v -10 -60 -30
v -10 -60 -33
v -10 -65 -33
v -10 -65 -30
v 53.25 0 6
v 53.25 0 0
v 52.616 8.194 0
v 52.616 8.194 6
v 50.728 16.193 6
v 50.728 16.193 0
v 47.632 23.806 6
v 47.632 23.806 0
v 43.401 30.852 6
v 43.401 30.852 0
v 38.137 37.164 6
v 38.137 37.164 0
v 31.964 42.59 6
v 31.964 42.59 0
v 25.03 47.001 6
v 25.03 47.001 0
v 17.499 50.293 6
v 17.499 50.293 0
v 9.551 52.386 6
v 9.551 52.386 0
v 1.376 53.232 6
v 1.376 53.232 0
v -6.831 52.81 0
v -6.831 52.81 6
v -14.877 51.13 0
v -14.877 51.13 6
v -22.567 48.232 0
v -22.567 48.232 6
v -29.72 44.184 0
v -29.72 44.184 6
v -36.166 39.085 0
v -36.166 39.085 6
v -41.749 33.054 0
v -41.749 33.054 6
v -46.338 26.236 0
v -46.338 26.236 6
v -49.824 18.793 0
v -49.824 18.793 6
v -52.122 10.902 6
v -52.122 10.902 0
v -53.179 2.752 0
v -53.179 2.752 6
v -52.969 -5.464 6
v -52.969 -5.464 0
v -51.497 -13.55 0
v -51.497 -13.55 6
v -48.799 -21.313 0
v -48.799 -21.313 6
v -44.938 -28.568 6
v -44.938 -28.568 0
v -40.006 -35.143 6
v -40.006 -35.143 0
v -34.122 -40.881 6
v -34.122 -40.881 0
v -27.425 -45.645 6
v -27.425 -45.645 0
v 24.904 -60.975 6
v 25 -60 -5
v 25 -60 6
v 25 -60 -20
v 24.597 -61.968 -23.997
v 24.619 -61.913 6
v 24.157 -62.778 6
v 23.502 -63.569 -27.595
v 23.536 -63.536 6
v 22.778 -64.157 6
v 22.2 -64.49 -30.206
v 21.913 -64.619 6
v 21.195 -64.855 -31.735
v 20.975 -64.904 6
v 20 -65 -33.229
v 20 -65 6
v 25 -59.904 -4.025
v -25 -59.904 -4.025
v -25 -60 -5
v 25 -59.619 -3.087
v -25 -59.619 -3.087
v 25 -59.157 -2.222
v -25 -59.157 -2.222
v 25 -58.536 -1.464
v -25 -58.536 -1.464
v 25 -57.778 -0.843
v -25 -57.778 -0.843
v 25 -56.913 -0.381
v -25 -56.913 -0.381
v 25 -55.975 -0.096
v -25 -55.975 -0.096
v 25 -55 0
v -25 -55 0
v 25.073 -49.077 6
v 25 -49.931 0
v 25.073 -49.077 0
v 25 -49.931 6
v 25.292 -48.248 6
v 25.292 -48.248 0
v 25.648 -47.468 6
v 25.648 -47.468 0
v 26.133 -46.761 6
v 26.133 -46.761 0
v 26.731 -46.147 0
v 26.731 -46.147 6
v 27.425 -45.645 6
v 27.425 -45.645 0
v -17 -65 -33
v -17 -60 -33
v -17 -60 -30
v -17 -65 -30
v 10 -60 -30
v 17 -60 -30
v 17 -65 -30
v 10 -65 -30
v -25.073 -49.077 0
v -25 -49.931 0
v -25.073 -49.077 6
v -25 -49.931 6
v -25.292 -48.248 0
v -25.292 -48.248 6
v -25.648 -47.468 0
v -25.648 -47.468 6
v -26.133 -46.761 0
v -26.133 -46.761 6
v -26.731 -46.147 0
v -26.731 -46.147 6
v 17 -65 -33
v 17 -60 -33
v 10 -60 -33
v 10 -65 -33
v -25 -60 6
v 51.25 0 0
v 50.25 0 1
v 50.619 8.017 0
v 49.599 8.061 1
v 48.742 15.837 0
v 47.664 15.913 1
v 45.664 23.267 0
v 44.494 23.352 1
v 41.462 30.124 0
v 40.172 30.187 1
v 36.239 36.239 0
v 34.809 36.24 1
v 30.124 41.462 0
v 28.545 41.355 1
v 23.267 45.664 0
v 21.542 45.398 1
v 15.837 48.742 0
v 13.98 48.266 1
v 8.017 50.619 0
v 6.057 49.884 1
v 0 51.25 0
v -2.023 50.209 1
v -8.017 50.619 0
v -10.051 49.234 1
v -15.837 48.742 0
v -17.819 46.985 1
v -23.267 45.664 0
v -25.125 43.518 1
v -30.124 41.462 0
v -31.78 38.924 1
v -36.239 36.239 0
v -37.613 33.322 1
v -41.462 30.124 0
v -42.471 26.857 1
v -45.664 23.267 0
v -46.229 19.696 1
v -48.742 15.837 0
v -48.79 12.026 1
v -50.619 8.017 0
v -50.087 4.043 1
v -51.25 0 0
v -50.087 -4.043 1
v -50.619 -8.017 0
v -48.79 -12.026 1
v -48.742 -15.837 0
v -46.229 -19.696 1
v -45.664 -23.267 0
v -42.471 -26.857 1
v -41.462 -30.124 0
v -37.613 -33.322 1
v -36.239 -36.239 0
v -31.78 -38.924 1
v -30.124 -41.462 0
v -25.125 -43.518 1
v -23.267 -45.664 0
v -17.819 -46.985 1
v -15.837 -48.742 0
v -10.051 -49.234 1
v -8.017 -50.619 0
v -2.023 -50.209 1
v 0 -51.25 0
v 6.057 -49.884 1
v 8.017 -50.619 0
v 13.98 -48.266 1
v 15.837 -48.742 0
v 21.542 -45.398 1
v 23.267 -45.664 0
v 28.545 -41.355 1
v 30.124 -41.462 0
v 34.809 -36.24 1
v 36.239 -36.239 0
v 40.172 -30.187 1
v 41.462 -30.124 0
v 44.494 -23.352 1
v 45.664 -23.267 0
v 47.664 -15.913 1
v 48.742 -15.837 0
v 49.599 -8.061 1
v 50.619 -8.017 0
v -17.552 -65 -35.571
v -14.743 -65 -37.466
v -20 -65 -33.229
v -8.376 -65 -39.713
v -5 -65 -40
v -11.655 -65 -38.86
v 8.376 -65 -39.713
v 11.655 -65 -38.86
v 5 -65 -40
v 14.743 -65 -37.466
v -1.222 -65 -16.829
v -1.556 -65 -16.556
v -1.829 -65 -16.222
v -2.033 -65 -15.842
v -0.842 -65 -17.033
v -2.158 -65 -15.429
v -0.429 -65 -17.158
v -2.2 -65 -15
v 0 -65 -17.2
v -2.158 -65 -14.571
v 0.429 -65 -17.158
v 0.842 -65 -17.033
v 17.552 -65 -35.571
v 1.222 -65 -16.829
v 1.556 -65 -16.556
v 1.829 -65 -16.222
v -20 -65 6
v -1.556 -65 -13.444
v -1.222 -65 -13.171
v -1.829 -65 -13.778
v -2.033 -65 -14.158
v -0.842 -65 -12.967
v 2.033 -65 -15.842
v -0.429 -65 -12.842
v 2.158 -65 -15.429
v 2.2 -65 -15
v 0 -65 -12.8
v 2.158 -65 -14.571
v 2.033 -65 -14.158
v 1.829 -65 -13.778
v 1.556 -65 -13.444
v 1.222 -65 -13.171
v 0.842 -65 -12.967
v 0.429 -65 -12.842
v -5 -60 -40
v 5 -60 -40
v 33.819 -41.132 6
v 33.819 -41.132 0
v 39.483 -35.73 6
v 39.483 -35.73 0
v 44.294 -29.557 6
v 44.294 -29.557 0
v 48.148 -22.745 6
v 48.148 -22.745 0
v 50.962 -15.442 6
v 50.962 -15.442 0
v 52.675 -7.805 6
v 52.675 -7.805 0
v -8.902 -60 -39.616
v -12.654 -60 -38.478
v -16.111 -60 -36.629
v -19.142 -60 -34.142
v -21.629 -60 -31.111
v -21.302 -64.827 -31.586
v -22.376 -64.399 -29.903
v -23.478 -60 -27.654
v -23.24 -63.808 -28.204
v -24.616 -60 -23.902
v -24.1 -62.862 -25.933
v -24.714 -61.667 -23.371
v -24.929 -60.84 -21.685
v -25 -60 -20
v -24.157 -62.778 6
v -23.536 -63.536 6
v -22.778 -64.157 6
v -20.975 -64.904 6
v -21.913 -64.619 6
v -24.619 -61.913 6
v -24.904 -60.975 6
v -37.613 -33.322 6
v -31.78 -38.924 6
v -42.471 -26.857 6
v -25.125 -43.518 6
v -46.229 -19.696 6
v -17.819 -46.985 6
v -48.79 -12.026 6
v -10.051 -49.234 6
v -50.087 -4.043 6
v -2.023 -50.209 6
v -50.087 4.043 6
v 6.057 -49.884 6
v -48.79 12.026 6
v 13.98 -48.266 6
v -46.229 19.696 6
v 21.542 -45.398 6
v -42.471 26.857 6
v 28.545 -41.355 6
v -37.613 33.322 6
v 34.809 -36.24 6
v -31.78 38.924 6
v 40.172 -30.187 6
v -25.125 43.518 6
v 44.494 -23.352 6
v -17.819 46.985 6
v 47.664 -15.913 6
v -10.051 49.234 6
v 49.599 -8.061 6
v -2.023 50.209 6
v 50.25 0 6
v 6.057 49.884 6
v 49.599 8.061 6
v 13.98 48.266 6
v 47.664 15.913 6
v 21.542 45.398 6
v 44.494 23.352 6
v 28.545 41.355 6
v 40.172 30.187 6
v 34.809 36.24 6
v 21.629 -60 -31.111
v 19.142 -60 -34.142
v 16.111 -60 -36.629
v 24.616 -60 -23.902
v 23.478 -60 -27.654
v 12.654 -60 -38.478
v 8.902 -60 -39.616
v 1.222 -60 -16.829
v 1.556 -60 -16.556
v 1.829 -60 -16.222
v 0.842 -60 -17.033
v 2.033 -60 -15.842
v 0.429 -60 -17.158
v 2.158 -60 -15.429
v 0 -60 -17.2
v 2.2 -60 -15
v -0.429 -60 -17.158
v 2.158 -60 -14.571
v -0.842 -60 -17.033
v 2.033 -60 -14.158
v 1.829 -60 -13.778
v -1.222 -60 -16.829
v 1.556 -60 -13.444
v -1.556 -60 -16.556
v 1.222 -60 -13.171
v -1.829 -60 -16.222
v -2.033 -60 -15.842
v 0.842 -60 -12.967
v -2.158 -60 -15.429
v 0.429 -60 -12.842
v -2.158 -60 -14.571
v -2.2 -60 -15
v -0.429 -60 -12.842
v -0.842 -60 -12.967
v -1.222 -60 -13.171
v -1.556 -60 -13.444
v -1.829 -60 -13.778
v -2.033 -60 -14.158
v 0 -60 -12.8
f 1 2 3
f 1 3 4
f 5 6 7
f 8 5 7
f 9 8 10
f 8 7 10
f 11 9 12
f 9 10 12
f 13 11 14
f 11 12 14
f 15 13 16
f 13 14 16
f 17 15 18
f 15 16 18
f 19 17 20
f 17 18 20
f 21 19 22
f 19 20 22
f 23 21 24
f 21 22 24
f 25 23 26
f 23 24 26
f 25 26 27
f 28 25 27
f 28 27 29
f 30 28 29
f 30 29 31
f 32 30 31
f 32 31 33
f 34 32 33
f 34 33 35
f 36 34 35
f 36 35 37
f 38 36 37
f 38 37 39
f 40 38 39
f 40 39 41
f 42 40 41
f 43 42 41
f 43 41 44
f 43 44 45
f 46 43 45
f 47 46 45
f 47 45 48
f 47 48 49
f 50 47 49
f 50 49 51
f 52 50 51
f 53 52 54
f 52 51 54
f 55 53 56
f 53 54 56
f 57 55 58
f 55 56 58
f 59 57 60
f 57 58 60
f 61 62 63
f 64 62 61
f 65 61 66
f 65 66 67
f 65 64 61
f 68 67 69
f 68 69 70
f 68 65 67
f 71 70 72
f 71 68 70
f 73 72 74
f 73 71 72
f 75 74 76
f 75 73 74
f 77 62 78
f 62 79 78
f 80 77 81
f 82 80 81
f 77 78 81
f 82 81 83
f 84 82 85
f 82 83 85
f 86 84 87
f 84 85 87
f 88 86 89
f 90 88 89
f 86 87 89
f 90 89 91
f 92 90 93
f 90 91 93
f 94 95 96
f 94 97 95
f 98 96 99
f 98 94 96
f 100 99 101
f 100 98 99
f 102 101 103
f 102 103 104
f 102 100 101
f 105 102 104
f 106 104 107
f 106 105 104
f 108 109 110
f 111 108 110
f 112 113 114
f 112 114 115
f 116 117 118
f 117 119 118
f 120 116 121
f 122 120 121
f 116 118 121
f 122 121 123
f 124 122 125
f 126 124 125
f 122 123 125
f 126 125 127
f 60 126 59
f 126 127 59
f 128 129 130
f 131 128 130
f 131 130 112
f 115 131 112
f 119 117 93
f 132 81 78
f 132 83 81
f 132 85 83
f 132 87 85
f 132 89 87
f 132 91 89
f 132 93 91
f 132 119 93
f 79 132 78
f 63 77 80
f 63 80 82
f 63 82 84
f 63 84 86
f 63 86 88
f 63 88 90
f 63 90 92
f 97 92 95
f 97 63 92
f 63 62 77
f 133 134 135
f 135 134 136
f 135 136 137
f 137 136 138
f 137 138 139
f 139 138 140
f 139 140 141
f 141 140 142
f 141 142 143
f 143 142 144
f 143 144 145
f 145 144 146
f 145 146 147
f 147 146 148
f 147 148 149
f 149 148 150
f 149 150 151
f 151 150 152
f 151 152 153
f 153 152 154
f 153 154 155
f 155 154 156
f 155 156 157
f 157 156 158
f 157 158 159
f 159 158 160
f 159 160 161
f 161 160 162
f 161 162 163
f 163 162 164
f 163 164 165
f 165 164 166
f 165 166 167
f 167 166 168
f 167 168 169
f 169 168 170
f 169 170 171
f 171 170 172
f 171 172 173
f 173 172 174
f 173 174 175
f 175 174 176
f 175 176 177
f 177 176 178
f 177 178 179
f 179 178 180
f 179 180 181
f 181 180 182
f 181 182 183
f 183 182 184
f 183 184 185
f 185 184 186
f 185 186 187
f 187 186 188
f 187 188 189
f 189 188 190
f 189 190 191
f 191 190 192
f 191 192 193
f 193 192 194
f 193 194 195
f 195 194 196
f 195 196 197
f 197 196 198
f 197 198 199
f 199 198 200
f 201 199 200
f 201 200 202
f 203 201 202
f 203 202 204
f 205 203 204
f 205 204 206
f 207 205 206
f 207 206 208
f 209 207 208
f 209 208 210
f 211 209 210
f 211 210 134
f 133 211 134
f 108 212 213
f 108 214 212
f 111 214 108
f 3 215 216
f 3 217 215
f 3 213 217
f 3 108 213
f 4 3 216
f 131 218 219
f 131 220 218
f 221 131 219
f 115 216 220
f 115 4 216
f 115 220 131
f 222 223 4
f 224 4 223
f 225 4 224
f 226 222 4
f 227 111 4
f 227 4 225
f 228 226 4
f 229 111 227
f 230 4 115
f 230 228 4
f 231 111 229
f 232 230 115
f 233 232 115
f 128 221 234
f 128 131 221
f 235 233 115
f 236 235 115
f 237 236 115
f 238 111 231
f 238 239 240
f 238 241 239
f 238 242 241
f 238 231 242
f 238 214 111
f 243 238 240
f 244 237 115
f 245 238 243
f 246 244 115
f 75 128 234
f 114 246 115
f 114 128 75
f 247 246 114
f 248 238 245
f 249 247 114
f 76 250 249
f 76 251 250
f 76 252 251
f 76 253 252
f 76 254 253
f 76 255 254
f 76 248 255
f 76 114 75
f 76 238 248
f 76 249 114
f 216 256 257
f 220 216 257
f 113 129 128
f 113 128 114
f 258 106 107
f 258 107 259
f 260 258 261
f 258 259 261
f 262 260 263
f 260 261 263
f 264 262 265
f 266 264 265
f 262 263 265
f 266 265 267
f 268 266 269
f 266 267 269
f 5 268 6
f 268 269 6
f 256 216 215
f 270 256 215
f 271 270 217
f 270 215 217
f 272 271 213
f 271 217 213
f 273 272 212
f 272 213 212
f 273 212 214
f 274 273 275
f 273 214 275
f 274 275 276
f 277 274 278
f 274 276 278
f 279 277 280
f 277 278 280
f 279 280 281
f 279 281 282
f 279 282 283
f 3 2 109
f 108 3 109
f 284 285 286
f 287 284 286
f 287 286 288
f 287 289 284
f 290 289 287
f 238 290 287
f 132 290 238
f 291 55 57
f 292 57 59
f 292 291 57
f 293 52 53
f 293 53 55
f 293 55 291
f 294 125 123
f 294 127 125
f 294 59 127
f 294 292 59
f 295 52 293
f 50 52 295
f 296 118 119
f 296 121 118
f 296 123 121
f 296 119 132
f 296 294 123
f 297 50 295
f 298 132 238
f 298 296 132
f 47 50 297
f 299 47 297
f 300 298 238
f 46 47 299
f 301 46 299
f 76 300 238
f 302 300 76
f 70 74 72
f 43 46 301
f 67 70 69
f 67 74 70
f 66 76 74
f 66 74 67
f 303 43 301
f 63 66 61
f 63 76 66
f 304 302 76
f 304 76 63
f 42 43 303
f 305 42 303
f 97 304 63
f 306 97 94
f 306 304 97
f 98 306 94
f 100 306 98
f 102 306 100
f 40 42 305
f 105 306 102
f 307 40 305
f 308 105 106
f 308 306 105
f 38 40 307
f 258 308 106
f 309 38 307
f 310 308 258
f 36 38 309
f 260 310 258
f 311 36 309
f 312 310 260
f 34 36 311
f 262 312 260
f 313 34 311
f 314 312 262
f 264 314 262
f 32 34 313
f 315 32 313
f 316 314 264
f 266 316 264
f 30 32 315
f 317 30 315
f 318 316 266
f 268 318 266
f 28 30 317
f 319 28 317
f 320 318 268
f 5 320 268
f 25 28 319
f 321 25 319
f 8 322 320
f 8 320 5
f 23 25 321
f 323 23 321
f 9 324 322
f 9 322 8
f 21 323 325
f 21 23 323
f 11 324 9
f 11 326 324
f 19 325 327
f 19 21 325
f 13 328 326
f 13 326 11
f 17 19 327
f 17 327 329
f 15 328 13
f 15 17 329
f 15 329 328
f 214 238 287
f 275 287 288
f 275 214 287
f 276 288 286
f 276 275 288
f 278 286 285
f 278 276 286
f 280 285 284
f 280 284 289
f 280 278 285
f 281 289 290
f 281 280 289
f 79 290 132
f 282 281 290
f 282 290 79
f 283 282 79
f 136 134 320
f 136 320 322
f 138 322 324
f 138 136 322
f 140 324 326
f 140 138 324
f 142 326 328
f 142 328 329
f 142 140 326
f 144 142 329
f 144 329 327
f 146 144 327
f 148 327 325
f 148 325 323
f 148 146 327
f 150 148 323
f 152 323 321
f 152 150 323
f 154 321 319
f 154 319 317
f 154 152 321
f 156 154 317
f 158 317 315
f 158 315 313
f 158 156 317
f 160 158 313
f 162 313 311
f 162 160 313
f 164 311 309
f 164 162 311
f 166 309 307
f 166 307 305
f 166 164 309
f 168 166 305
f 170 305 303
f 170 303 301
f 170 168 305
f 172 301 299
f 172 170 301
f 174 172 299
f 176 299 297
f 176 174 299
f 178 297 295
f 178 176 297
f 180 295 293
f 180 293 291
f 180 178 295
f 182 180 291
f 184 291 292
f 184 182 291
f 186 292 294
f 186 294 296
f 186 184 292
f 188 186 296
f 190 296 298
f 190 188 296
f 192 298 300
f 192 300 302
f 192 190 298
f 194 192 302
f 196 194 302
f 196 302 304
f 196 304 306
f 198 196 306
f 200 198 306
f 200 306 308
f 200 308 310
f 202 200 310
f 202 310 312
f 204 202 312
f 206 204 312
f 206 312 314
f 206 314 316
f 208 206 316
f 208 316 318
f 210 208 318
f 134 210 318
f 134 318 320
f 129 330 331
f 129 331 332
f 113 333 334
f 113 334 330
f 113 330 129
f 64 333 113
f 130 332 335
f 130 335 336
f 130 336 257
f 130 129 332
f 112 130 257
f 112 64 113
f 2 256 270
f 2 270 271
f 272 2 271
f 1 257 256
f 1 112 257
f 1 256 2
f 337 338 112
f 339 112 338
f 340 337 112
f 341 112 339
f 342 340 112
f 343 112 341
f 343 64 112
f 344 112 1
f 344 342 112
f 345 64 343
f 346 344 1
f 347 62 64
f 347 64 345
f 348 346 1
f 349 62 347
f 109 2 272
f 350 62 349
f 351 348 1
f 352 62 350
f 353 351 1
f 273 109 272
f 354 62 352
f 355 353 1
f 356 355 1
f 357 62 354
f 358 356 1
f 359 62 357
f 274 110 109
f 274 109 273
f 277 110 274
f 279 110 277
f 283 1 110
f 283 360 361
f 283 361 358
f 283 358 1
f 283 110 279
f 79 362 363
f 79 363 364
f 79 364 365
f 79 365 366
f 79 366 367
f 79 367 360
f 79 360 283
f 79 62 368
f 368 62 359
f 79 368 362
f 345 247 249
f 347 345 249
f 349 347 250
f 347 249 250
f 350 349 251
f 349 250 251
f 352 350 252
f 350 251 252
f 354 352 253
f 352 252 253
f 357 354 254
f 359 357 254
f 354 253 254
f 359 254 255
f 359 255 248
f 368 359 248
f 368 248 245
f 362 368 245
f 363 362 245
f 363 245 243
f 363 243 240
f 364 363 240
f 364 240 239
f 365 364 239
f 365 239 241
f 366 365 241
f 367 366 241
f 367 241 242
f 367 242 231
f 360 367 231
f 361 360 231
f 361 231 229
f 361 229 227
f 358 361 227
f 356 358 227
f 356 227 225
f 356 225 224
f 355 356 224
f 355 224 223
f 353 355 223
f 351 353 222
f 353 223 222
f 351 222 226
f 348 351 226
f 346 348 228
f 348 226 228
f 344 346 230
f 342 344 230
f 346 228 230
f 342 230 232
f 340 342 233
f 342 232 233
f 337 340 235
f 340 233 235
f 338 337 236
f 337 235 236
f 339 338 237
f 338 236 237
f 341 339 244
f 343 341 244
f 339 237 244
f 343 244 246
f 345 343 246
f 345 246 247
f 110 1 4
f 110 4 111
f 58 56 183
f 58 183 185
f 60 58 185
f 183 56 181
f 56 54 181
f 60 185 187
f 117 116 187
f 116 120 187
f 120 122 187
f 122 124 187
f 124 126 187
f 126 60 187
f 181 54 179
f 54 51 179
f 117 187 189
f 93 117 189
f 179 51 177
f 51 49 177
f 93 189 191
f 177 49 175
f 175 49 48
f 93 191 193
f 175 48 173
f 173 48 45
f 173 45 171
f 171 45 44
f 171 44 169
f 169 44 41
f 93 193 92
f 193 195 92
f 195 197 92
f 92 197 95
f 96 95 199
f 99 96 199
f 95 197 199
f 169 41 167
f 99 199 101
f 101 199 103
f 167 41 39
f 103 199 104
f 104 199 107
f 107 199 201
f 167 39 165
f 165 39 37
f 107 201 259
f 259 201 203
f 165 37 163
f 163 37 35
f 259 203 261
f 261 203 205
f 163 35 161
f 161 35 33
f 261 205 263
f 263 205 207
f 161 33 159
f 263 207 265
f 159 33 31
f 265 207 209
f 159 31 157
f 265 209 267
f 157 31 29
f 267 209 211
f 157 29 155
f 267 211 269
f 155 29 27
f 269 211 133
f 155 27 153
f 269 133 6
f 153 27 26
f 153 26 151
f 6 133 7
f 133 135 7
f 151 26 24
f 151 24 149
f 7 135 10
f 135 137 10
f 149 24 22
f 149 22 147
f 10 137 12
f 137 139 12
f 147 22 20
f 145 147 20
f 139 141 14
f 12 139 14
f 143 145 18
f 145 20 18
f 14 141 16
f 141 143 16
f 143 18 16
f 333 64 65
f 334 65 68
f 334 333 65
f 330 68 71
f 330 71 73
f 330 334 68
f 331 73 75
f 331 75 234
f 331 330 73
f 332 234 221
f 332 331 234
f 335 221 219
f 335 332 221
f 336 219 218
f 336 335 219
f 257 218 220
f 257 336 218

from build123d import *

# Parameters (mm, degrees)
F0_R        = 50.25
F1_DEPTH    = 6
F2_DEPTH    = 40
F4_D        = 4.4
F3_W        = 7
F3_H        = 3
F5_DEPTH    = 25
F6_R        = 5
F7_R        = 20
F8_T1_DEPTH = 59.75
F9_SIZE     = 1


# Not quite as in the source:
# - a fillet or chamfer that OpenCascade refuses, or shapes differently, is made with other operations: its cross-section is extruded or revolved along the edge and cut away or added


with BuildPart() as f1:
    # F0 (on Top) → F1 (new body)
    with BuildSketch(Plane.XY):
        with BuildLine():
            ThreePointArc((25, -47.0166194021), (45.6443452138, -27.4254671792), (53.25, 0))
            ThreePointArc((53.25, 0), (-27.4254671792, 45.6443452138), (-25, -47.0166194021))
            ThreePointArc((-25, -47.0166194021), (0, -53.25), (25, -47.0166194021))
        make_face()
        Circle(F0_R, mode=Mode.SUBTRACT)
        with BuildLine():
            ThreePointArc((25, -47.0166194021), (0, -53.25), (-25, -47.0166194021))
            Line((-25, -47.0166194021), (-25, -60))
            Line((-25, -60), (25, -60))
            Line((25, -60), (25, -47.0166194021))
        make_face()
        Polygon((25, -60), (-25, -60), (-25, -65), (0, -65), (25, -65), align=None)
    extrude(amount=F1_DEPTH)

    # F0 (on Top) → F2 (join)
    with BuildSketch(Plane.XY):
        Polygon((25, -60), (-25, -60), (-25, -65), (0, -65), (25, -65), align=None)
    extrude(amount=-F2_DEPTH)

    # F4 (through all)
    with Locations(Plane(origin=(0, -60, 0), x_dir=(-1, 0, 0), z_dir=(0, 1, 0))):
        with Locations((0, -15)):
            Hole(F4_D / 2)

    # F3 (on face) → F5 (cut)
    with BuildSketch(Plane(origin=(0, -60, 0), x_dir=(-1, 0, 0), z_dir=(0, 1, 0))):
        with Locations((-13.5, -31.5)):
            Rectangle(F3_W, F3_H)
        with Locations((13.5, -31.5)):
            Rectangle(F3_W, F3_H)
    extrude(amount=-F5_DEPTH, mode=Mode.SUBTRACT)

    # F6
    f6_edges = [f1.edges().sort_by_distance(p)[0] for p in [
        (-25, -47.016619, 3),
        (25, -47.016619, 3),
        (0, -60, 0),
    ]]
    fillet(f6_edges, radius=F6_R)

    # F7
    f7_edges = [f1.edges().sort_by_distance(p)[0] for p in [
        (25, -62.5, -40),
        (-25, -62.5, -40),
    ]]
    fillet(f7_edges, radius=F7_R)

    # F8: fillet of radius 5 on 2 edges, made by hand

    # F8_s2 → F8_t1 (cut)
    with BuildSketch(Plane.XY.offset(-41.25)):
        with BuildLine():
            ThreePointArc((25, -60), (23.5355339059, -63.5355339059), (20, -65))
            Line((20, -65), (25, -65))
            Line((25, -65), (25, -60))
        make_face()
        with BuildLine():
            ThreePointArc((-20, -65), (-23.5355339059, -63.5355339059), (-25, -60))
            Line((-25, -60), (-25, -65))
            Line((-25, -65), (-20, -65))
        make_face()
    extrude(amount=F8_T1_DEPTH, mode=Mode.SUBTRACT)

    # F9
    f9_edges = [f1.edges().sort_by_distance(p)[0] for p in [
        (-50.25, 0, 0),
    ]]
    chamfer(f9_edges, length=F9_SIZE)


solid = f1.part
